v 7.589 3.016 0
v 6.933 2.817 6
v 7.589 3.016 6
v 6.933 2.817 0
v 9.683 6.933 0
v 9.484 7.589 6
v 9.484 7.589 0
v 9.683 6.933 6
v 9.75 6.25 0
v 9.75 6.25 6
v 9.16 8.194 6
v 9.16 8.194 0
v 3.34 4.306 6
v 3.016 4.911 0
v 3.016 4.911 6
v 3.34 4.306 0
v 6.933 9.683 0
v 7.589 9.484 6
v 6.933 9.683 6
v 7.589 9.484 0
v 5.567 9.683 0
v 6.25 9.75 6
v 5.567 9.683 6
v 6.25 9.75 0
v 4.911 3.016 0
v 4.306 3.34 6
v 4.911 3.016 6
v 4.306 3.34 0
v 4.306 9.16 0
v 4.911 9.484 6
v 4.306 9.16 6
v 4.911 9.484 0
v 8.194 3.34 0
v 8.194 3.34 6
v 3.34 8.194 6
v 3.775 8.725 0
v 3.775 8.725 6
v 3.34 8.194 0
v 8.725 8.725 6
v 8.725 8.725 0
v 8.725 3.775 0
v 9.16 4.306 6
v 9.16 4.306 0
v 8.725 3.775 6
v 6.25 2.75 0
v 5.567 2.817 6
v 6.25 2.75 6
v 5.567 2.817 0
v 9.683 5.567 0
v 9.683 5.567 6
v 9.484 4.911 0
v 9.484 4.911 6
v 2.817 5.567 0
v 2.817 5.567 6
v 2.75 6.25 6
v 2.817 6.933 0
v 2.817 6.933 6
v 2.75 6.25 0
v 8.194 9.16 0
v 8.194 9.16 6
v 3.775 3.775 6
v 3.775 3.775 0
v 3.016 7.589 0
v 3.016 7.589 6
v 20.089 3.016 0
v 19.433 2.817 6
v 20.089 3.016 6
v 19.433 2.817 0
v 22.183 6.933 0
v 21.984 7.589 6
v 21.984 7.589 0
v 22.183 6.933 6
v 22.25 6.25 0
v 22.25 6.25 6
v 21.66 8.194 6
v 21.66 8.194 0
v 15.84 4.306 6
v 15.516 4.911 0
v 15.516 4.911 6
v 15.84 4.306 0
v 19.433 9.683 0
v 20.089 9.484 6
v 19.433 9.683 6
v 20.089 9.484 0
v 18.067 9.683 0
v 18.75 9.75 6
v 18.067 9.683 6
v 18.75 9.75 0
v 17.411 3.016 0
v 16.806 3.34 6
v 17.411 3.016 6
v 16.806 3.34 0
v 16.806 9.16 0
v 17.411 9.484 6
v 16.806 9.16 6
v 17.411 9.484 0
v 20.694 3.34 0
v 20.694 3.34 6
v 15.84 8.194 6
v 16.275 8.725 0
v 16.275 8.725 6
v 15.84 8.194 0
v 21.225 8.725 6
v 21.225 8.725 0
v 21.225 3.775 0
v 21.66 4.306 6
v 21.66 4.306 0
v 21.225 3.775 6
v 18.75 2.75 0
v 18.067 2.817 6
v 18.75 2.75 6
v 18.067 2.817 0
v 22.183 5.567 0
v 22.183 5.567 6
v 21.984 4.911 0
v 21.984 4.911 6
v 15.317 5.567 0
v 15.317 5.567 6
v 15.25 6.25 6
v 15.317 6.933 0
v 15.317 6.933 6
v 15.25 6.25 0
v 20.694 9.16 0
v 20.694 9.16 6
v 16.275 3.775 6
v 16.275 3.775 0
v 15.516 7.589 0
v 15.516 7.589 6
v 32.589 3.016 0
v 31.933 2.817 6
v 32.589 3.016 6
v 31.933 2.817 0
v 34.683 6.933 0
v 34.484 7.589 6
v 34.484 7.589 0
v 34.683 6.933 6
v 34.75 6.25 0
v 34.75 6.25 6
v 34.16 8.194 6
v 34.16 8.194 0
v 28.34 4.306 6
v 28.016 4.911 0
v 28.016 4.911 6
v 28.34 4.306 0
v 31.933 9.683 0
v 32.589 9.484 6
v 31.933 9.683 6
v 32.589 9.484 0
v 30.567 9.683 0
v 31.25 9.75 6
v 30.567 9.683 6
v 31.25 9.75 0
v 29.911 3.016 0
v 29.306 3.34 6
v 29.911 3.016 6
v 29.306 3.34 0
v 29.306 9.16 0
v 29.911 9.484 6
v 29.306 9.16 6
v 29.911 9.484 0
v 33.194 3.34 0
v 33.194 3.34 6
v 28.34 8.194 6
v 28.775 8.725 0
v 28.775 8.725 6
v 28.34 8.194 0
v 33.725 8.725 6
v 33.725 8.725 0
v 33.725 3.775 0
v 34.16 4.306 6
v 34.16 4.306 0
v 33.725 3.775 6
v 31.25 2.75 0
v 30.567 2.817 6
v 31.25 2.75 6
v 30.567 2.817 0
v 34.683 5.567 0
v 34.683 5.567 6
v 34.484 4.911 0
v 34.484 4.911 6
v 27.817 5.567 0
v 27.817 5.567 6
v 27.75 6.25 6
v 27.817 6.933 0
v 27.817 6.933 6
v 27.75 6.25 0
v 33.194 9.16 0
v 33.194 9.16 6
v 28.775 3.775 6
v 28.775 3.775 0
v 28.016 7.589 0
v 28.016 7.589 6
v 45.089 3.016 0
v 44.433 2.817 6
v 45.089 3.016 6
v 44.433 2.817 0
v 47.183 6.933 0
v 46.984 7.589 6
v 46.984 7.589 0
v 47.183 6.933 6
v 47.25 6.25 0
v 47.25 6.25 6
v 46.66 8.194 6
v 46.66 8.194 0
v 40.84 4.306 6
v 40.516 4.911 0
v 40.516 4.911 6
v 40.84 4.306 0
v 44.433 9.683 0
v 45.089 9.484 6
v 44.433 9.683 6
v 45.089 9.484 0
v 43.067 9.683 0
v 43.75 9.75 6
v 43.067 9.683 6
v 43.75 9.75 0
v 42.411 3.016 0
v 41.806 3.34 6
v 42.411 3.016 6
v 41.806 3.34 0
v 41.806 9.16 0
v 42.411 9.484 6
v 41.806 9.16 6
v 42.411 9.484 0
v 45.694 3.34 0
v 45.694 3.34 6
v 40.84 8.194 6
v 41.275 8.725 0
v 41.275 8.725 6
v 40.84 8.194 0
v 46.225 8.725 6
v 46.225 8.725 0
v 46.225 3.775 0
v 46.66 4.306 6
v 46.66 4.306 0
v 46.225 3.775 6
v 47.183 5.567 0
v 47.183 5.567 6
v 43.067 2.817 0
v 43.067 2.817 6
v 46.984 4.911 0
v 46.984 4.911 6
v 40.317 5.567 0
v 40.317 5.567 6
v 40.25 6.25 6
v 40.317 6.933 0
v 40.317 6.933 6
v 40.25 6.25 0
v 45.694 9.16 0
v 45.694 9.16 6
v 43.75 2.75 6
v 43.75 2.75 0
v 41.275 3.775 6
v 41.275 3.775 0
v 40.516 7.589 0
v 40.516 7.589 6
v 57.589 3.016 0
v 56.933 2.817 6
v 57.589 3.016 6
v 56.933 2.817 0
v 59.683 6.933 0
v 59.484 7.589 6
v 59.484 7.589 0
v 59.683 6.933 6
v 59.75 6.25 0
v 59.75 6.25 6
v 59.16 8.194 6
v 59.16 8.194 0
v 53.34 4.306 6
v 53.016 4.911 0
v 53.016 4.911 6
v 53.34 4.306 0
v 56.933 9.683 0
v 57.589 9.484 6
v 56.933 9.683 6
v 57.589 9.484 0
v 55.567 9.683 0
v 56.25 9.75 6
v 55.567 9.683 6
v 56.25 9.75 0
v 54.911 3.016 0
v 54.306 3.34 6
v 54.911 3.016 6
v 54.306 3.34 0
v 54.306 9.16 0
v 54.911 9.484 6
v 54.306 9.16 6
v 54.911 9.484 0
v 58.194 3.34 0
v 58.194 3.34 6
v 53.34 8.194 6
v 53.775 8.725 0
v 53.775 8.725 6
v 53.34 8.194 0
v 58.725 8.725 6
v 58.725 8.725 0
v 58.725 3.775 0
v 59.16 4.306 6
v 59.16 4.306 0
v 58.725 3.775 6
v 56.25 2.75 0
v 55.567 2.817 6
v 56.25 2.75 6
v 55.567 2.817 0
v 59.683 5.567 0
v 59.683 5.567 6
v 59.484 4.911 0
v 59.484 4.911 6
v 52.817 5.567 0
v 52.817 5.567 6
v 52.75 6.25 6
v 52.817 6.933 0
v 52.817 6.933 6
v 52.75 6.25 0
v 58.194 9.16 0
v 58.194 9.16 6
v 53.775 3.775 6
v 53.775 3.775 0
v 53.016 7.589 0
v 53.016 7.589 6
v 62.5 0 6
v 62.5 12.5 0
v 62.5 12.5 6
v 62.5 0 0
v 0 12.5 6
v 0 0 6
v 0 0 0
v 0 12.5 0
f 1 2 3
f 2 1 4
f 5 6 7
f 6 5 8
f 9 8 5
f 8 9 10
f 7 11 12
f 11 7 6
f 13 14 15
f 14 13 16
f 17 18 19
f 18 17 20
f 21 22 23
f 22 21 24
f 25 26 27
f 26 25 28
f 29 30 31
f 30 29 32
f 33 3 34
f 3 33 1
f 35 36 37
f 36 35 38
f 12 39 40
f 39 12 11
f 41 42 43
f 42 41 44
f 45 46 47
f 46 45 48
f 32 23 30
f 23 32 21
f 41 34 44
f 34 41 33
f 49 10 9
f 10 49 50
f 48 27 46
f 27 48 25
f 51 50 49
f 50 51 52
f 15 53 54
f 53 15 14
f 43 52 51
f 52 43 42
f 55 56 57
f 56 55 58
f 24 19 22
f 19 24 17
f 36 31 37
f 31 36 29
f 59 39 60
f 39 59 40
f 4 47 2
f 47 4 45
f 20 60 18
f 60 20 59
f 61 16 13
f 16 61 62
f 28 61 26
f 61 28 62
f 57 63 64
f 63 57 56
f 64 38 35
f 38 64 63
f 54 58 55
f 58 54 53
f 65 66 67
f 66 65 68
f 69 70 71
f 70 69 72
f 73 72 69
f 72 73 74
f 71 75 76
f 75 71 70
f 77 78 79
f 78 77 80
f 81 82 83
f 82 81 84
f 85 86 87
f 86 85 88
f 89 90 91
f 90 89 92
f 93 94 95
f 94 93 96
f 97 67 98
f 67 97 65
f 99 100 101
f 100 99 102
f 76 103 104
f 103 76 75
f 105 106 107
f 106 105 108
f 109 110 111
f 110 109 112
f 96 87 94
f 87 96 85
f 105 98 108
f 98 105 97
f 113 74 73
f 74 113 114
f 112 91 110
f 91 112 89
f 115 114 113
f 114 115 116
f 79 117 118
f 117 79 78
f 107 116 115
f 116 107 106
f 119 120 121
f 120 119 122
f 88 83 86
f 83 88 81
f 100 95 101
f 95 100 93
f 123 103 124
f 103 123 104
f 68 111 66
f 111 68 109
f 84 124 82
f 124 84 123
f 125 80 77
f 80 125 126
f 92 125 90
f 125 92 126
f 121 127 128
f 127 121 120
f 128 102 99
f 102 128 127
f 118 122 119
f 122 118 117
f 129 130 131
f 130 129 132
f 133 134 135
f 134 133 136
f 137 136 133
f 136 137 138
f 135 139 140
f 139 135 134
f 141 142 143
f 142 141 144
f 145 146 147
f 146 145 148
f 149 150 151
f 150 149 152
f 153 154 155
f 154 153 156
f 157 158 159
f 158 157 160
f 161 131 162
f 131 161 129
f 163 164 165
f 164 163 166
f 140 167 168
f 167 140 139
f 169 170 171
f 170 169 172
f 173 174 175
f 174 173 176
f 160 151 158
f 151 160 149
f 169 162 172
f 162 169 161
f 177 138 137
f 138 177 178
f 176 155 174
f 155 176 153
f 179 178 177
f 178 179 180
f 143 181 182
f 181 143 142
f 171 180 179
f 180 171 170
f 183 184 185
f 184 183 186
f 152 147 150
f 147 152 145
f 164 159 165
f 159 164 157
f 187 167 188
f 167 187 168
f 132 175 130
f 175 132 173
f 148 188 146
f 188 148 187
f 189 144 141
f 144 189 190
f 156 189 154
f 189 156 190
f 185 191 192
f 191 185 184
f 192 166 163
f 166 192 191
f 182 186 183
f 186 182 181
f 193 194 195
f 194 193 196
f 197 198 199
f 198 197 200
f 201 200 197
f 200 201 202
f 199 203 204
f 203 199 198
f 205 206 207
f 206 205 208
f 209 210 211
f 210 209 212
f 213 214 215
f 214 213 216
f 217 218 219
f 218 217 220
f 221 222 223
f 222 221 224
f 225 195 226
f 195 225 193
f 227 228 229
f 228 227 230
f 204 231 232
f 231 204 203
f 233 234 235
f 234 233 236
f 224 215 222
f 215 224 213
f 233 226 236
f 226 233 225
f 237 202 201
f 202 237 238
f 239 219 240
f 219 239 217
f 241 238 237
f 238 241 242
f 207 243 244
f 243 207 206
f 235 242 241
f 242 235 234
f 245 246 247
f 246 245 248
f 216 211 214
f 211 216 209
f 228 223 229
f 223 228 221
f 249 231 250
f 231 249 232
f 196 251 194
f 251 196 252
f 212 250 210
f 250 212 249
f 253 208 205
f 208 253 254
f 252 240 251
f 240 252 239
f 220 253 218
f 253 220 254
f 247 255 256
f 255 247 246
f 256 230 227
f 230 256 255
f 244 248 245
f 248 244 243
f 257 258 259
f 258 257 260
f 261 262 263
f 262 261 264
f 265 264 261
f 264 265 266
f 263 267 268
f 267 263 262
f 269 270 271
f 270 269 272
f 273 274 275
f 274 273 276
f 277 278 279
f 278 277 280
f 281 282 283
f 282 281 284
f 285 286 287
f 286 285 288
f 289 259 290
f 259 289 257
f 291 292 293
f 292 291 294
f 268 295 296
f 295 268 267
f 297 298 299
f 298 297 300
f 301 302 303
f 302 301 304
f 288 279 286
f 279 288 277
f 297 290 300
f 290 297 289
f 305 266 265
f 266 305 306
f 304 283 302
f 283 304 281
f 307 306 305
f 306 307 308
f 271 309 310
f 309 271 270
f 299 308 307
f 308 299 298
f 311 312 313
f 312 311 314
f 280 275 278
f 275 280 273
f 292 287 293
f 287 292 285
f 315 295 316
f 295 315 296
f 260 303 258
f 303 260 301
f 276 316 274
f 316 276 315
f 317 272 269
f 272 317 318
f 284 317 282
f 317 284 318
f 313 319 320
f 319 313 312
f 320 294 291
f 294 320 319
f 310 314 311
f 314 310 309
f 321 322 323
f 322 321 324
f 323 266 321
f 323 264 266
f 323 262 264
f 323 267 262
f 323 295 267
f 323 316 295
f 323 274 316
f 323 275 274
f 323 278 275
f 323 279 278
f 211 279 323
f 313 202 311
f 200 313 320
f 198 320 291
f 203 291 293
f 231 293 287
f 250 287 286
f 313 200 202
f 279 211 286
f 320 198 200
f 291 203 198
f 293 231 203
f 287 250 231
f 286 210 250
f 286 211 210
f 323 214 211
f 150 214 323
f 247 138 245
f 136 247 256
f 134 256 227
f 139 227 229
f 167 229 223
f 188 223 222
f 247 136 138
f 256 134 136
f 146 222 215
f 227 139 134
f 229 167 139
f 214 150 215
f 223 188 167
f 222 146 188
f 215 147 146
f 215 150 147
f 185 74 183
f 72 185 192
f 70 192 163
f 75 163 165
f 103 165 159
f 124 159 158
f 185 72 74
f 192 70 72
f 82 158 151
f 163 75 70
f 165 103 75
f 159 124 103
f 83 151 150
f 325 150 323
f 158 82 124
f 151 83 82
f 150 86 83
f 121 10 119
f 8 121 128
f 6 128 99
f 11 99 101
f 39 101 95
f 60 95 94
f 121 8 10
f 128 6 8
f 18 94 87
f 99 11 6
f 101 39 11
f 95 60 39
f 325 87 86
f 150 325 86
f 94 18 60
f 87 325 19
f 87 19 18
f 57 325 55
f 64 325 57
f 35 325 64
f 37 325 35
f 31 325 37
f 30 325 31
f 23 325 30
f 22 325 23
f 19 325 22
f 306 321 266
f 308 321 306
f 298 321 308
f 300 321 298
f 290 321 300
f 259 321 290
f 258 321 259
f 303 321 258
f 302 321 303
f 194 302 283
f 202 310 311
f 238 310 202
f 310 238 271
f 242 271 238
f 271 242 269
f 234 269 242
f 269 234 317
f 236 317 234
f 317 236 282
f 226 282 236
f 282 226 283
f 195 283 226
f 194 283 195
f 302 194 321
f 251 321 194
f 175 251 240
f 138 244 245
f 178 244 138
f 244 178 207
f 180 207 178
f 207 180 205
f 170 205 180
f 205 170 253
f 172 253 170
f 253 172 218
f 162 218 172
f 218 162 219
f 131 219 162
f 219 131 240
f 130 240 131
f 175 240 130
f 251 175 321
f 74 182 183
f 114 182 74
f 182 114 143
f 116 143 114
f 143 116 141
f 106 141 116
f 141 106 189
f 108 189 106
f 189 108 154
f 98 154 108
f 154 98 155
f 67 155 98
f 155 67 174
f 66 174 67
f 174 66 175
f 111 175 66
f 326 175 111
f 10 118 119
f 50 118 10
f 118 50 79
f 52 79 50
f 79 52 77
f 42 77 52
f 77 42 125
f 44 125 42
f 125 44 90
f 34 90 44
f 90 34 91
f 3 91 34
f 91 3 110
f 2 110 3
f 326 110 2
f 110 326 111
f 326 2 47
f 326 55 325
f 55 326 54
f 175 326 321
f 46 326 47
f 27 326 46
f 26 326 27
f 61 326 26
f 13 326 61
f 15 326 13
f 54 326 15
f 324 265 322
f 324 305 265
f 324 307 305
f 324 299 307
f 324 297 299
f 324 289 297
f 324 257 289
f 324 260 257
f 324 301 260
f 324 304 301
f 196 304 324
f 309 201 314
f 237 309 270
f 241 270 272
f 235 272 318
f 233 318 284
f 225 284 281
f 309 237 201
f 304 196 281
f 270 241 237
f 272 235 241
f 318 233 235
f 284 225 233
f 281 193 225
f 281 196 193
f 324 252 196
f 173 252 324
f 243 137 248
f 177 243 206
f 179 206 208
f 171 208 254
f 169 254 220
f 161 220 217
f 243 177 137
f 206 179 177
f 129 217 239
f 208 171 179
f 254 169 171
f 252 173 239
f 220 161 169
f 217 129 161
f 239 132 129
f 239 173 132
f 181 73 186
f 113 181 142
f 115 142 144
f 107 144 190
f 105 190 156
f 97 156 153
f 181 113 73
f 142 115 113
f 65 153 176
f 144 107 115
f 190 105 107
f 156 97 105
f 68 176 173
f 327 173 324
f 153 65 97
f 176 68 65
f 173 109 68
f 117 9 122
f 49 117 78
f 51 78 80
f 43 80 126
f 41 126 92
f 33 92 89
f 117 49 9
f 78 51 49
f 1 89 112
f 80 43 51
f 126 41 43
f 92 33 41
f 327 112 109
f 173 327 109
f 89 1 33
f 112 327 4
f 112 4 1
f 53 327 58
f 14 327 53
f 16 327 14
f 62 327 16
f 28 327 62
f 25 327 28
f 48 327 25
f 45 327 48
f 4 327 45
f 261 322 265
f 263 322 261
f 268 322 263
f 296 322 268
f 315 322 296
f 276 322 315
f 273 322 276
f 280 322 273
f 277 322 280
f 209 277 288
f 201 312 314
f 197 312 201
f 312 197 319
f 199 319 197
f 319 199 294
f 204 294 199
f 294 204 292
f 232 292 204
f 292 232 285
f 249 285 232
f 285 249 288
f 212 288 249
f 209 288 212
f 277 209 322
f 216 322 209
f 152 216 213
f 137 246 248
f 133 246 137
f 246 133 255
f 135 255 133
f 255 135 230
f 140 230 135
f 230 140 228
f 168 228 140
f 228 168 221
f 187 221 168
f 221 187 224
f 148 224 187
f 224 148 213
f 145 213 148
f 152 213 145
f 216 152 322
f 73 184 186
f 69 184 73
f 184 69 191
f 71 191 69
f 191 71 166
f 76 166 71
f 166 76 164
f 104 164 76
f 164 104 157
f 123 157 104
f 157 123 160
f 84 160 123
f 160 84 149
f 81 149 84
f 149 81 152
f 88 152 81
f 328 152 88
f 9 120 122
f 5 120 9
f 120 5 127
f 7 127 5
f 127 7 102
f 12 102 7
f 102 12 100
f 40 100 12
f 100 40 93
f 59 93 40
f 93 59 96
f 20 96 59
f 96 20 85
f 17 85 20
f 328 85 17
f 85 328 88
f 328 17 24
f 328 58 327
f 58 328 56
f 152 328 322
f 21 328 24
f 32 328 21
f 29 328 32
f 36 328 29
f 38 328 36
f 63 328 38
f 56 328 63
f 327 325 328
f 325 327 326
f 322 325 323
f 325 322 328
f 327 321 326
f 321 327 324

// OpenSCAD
// pro-beam-tu05 — ToyVentor hole grid: 5 units at 12.5 mm pitch, 7.0 mm free holes.
// Simplified blockout of the rounded TU05 teaser beam (docs/pro.md):
// correct pitch and hole pattern first, fillets come with the print tests.
pitch = 12.5;
units = 5;
thickness = 6;
difference() {
  cube([units * pitch, pitch, thickness]);
  for (i = [0 : units - 1])
    translate([(i + 0.5) * pitch, pitch / 2, -1])
      cylinder(d = 7.0, h = thickness + 2, $fn = 32);
}
